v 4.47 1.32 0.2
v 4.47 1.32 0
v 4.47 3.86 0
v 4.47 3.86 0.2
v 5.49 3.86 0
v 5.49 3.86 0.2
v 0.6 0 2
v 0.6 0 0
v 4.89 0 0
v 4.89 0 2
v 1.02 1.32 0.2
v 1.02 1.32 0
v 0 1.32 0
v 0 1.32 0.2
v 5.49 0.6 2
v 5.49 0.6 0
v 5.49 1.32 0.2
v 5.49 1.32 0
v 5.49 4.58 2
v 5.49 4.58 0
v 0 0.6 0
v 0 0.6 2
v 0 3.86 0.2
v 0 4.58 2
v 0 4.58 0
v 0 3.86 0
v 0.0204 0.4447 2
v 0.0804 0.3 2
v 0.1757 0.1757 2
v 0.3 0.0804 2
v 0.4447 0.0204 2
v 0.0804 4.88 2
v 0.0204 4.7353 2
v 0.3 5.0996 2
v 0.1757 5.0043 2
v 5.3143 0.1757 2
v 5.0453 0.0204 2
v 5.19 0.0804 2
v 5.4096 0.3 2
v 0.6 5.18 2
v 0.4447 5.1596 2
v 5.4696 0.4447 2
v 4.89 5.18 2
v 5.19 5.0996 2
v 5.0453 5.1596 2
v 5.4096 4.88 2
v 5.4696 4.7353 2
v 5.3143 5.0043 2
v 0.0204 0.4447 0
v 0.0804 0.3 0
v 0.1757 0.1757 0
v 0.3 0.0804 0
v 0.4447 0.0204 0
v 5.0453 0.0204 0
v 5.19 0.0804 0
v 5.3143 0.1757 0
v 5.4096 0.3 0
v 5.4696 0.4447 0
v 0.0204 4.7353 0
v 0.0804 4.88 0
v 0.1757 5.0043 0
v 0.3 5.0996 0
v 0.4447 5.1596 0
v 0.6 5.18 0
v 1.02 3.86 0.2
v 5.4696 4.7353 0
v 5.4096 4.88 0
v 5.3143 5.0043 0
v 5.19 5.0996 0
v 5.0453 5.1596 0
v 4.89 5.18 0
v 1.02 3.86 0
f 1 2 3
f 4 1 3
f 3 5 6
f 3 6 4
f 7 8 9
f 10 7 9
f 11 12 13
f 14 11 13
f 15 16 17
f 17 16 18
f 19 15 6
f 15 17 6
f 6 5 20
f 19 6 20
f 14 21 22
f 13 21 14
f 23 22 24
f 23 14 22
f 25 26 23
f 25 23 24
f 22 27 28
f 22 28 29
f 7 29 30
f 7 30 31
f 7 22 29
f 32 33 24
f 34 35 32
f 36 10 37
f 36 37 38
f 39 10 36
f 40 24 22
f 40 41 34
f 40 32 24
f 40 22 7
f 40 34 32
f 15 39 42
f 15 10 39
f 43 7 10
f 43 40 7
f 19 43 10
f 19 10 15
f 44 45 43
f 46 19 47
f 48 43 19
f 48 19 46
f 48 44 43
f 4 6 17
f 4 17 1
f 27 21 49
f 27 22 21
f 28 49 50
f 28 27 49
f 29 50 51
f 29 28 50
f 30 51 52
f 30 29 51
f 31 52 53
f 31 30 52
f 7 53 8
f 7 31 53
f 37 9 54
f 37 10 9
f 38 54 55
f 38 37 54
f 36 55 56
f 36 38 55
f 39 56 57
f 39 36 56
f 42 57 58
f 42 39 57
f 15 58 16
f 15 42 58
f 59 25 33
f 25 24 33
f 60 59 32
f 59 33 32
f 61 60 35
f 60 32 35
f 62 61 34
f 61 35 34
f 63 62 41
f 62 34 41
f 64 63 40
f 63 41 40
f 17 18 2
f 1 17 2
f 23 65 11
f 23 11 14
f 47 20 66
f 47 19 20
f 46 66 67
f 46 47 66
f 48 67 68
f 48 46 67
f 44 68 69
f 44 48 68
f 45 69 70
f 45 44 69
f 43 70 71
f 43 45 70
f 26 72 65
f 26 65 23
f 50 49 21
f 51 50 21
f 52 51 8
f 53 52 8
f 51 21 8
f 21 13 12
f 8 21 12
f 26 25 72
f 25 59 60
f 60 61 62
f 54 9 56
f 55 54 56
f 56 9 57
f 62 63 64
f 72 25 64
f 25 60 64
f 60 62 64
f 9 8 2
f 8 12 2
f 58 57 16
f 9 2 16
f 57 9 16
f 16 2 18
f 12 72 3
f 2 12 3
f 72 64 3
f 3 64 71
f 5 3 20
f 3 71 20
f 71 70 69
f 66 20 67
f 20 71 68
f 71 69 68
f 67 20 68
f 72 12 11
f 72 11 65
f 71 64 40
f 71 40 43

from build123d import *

# Parameters (mm, degrees)
ESQUISSE1_W             = 5.49
ESQUISSE1_H             = 5.18
BOSS_EXTRU_1_DEPTH      = 2
CONG_1_R                = 0.6
ESQUISSE2_W             = 1.02
ESQUISSE2_H             = 2.54
ENL_V_MAT_EXTRU_1_DEPTH = 0.2


with BuildPart() as part:
    # Esquisse1 → Boss.-Extru.1 (new body)
    with BuildSketch(Plane.XY):
        with Locations((2.745, 2.59)):
            Rectangle(ESQUISSE1_W, ESQUISSE1_H)
    extrude(amount=BOSS_EXTRU_1_DEPTH)

    # Congé1
    cong_1_edges = [part.edges().sort_by_distance(p)[0] for p in [
        (0, 5.18, 1),
        (5.49, 5.18, 1),
        (5.49, 0, 1),
        (0, 0, 1),
    ]]
    fillet(cong_1_edges, radius=CONG_1_R)

    # Esquisse2 → Enlèv. mat.-Extru.1 (cut)
    with BuildSketch(Plane(origin=(0, 0, 0), x_dir=(-1, 0, 0), z_dir=(0, 0, -1))):
        with Locations((-0.51, 2.59)):
            Rectangle(ESQUISSE2_W, ESQUISSE2_H)
        with Locations((-4.98, 2.59)):
            Rectangle(ESQUISSE2_W, ESQUISSE2_H)
    extrude(amount=-ENL_V_MAT_EXTRU_1_DEPTH, mode=Mode.SUBTRACT)


solid = part.part
